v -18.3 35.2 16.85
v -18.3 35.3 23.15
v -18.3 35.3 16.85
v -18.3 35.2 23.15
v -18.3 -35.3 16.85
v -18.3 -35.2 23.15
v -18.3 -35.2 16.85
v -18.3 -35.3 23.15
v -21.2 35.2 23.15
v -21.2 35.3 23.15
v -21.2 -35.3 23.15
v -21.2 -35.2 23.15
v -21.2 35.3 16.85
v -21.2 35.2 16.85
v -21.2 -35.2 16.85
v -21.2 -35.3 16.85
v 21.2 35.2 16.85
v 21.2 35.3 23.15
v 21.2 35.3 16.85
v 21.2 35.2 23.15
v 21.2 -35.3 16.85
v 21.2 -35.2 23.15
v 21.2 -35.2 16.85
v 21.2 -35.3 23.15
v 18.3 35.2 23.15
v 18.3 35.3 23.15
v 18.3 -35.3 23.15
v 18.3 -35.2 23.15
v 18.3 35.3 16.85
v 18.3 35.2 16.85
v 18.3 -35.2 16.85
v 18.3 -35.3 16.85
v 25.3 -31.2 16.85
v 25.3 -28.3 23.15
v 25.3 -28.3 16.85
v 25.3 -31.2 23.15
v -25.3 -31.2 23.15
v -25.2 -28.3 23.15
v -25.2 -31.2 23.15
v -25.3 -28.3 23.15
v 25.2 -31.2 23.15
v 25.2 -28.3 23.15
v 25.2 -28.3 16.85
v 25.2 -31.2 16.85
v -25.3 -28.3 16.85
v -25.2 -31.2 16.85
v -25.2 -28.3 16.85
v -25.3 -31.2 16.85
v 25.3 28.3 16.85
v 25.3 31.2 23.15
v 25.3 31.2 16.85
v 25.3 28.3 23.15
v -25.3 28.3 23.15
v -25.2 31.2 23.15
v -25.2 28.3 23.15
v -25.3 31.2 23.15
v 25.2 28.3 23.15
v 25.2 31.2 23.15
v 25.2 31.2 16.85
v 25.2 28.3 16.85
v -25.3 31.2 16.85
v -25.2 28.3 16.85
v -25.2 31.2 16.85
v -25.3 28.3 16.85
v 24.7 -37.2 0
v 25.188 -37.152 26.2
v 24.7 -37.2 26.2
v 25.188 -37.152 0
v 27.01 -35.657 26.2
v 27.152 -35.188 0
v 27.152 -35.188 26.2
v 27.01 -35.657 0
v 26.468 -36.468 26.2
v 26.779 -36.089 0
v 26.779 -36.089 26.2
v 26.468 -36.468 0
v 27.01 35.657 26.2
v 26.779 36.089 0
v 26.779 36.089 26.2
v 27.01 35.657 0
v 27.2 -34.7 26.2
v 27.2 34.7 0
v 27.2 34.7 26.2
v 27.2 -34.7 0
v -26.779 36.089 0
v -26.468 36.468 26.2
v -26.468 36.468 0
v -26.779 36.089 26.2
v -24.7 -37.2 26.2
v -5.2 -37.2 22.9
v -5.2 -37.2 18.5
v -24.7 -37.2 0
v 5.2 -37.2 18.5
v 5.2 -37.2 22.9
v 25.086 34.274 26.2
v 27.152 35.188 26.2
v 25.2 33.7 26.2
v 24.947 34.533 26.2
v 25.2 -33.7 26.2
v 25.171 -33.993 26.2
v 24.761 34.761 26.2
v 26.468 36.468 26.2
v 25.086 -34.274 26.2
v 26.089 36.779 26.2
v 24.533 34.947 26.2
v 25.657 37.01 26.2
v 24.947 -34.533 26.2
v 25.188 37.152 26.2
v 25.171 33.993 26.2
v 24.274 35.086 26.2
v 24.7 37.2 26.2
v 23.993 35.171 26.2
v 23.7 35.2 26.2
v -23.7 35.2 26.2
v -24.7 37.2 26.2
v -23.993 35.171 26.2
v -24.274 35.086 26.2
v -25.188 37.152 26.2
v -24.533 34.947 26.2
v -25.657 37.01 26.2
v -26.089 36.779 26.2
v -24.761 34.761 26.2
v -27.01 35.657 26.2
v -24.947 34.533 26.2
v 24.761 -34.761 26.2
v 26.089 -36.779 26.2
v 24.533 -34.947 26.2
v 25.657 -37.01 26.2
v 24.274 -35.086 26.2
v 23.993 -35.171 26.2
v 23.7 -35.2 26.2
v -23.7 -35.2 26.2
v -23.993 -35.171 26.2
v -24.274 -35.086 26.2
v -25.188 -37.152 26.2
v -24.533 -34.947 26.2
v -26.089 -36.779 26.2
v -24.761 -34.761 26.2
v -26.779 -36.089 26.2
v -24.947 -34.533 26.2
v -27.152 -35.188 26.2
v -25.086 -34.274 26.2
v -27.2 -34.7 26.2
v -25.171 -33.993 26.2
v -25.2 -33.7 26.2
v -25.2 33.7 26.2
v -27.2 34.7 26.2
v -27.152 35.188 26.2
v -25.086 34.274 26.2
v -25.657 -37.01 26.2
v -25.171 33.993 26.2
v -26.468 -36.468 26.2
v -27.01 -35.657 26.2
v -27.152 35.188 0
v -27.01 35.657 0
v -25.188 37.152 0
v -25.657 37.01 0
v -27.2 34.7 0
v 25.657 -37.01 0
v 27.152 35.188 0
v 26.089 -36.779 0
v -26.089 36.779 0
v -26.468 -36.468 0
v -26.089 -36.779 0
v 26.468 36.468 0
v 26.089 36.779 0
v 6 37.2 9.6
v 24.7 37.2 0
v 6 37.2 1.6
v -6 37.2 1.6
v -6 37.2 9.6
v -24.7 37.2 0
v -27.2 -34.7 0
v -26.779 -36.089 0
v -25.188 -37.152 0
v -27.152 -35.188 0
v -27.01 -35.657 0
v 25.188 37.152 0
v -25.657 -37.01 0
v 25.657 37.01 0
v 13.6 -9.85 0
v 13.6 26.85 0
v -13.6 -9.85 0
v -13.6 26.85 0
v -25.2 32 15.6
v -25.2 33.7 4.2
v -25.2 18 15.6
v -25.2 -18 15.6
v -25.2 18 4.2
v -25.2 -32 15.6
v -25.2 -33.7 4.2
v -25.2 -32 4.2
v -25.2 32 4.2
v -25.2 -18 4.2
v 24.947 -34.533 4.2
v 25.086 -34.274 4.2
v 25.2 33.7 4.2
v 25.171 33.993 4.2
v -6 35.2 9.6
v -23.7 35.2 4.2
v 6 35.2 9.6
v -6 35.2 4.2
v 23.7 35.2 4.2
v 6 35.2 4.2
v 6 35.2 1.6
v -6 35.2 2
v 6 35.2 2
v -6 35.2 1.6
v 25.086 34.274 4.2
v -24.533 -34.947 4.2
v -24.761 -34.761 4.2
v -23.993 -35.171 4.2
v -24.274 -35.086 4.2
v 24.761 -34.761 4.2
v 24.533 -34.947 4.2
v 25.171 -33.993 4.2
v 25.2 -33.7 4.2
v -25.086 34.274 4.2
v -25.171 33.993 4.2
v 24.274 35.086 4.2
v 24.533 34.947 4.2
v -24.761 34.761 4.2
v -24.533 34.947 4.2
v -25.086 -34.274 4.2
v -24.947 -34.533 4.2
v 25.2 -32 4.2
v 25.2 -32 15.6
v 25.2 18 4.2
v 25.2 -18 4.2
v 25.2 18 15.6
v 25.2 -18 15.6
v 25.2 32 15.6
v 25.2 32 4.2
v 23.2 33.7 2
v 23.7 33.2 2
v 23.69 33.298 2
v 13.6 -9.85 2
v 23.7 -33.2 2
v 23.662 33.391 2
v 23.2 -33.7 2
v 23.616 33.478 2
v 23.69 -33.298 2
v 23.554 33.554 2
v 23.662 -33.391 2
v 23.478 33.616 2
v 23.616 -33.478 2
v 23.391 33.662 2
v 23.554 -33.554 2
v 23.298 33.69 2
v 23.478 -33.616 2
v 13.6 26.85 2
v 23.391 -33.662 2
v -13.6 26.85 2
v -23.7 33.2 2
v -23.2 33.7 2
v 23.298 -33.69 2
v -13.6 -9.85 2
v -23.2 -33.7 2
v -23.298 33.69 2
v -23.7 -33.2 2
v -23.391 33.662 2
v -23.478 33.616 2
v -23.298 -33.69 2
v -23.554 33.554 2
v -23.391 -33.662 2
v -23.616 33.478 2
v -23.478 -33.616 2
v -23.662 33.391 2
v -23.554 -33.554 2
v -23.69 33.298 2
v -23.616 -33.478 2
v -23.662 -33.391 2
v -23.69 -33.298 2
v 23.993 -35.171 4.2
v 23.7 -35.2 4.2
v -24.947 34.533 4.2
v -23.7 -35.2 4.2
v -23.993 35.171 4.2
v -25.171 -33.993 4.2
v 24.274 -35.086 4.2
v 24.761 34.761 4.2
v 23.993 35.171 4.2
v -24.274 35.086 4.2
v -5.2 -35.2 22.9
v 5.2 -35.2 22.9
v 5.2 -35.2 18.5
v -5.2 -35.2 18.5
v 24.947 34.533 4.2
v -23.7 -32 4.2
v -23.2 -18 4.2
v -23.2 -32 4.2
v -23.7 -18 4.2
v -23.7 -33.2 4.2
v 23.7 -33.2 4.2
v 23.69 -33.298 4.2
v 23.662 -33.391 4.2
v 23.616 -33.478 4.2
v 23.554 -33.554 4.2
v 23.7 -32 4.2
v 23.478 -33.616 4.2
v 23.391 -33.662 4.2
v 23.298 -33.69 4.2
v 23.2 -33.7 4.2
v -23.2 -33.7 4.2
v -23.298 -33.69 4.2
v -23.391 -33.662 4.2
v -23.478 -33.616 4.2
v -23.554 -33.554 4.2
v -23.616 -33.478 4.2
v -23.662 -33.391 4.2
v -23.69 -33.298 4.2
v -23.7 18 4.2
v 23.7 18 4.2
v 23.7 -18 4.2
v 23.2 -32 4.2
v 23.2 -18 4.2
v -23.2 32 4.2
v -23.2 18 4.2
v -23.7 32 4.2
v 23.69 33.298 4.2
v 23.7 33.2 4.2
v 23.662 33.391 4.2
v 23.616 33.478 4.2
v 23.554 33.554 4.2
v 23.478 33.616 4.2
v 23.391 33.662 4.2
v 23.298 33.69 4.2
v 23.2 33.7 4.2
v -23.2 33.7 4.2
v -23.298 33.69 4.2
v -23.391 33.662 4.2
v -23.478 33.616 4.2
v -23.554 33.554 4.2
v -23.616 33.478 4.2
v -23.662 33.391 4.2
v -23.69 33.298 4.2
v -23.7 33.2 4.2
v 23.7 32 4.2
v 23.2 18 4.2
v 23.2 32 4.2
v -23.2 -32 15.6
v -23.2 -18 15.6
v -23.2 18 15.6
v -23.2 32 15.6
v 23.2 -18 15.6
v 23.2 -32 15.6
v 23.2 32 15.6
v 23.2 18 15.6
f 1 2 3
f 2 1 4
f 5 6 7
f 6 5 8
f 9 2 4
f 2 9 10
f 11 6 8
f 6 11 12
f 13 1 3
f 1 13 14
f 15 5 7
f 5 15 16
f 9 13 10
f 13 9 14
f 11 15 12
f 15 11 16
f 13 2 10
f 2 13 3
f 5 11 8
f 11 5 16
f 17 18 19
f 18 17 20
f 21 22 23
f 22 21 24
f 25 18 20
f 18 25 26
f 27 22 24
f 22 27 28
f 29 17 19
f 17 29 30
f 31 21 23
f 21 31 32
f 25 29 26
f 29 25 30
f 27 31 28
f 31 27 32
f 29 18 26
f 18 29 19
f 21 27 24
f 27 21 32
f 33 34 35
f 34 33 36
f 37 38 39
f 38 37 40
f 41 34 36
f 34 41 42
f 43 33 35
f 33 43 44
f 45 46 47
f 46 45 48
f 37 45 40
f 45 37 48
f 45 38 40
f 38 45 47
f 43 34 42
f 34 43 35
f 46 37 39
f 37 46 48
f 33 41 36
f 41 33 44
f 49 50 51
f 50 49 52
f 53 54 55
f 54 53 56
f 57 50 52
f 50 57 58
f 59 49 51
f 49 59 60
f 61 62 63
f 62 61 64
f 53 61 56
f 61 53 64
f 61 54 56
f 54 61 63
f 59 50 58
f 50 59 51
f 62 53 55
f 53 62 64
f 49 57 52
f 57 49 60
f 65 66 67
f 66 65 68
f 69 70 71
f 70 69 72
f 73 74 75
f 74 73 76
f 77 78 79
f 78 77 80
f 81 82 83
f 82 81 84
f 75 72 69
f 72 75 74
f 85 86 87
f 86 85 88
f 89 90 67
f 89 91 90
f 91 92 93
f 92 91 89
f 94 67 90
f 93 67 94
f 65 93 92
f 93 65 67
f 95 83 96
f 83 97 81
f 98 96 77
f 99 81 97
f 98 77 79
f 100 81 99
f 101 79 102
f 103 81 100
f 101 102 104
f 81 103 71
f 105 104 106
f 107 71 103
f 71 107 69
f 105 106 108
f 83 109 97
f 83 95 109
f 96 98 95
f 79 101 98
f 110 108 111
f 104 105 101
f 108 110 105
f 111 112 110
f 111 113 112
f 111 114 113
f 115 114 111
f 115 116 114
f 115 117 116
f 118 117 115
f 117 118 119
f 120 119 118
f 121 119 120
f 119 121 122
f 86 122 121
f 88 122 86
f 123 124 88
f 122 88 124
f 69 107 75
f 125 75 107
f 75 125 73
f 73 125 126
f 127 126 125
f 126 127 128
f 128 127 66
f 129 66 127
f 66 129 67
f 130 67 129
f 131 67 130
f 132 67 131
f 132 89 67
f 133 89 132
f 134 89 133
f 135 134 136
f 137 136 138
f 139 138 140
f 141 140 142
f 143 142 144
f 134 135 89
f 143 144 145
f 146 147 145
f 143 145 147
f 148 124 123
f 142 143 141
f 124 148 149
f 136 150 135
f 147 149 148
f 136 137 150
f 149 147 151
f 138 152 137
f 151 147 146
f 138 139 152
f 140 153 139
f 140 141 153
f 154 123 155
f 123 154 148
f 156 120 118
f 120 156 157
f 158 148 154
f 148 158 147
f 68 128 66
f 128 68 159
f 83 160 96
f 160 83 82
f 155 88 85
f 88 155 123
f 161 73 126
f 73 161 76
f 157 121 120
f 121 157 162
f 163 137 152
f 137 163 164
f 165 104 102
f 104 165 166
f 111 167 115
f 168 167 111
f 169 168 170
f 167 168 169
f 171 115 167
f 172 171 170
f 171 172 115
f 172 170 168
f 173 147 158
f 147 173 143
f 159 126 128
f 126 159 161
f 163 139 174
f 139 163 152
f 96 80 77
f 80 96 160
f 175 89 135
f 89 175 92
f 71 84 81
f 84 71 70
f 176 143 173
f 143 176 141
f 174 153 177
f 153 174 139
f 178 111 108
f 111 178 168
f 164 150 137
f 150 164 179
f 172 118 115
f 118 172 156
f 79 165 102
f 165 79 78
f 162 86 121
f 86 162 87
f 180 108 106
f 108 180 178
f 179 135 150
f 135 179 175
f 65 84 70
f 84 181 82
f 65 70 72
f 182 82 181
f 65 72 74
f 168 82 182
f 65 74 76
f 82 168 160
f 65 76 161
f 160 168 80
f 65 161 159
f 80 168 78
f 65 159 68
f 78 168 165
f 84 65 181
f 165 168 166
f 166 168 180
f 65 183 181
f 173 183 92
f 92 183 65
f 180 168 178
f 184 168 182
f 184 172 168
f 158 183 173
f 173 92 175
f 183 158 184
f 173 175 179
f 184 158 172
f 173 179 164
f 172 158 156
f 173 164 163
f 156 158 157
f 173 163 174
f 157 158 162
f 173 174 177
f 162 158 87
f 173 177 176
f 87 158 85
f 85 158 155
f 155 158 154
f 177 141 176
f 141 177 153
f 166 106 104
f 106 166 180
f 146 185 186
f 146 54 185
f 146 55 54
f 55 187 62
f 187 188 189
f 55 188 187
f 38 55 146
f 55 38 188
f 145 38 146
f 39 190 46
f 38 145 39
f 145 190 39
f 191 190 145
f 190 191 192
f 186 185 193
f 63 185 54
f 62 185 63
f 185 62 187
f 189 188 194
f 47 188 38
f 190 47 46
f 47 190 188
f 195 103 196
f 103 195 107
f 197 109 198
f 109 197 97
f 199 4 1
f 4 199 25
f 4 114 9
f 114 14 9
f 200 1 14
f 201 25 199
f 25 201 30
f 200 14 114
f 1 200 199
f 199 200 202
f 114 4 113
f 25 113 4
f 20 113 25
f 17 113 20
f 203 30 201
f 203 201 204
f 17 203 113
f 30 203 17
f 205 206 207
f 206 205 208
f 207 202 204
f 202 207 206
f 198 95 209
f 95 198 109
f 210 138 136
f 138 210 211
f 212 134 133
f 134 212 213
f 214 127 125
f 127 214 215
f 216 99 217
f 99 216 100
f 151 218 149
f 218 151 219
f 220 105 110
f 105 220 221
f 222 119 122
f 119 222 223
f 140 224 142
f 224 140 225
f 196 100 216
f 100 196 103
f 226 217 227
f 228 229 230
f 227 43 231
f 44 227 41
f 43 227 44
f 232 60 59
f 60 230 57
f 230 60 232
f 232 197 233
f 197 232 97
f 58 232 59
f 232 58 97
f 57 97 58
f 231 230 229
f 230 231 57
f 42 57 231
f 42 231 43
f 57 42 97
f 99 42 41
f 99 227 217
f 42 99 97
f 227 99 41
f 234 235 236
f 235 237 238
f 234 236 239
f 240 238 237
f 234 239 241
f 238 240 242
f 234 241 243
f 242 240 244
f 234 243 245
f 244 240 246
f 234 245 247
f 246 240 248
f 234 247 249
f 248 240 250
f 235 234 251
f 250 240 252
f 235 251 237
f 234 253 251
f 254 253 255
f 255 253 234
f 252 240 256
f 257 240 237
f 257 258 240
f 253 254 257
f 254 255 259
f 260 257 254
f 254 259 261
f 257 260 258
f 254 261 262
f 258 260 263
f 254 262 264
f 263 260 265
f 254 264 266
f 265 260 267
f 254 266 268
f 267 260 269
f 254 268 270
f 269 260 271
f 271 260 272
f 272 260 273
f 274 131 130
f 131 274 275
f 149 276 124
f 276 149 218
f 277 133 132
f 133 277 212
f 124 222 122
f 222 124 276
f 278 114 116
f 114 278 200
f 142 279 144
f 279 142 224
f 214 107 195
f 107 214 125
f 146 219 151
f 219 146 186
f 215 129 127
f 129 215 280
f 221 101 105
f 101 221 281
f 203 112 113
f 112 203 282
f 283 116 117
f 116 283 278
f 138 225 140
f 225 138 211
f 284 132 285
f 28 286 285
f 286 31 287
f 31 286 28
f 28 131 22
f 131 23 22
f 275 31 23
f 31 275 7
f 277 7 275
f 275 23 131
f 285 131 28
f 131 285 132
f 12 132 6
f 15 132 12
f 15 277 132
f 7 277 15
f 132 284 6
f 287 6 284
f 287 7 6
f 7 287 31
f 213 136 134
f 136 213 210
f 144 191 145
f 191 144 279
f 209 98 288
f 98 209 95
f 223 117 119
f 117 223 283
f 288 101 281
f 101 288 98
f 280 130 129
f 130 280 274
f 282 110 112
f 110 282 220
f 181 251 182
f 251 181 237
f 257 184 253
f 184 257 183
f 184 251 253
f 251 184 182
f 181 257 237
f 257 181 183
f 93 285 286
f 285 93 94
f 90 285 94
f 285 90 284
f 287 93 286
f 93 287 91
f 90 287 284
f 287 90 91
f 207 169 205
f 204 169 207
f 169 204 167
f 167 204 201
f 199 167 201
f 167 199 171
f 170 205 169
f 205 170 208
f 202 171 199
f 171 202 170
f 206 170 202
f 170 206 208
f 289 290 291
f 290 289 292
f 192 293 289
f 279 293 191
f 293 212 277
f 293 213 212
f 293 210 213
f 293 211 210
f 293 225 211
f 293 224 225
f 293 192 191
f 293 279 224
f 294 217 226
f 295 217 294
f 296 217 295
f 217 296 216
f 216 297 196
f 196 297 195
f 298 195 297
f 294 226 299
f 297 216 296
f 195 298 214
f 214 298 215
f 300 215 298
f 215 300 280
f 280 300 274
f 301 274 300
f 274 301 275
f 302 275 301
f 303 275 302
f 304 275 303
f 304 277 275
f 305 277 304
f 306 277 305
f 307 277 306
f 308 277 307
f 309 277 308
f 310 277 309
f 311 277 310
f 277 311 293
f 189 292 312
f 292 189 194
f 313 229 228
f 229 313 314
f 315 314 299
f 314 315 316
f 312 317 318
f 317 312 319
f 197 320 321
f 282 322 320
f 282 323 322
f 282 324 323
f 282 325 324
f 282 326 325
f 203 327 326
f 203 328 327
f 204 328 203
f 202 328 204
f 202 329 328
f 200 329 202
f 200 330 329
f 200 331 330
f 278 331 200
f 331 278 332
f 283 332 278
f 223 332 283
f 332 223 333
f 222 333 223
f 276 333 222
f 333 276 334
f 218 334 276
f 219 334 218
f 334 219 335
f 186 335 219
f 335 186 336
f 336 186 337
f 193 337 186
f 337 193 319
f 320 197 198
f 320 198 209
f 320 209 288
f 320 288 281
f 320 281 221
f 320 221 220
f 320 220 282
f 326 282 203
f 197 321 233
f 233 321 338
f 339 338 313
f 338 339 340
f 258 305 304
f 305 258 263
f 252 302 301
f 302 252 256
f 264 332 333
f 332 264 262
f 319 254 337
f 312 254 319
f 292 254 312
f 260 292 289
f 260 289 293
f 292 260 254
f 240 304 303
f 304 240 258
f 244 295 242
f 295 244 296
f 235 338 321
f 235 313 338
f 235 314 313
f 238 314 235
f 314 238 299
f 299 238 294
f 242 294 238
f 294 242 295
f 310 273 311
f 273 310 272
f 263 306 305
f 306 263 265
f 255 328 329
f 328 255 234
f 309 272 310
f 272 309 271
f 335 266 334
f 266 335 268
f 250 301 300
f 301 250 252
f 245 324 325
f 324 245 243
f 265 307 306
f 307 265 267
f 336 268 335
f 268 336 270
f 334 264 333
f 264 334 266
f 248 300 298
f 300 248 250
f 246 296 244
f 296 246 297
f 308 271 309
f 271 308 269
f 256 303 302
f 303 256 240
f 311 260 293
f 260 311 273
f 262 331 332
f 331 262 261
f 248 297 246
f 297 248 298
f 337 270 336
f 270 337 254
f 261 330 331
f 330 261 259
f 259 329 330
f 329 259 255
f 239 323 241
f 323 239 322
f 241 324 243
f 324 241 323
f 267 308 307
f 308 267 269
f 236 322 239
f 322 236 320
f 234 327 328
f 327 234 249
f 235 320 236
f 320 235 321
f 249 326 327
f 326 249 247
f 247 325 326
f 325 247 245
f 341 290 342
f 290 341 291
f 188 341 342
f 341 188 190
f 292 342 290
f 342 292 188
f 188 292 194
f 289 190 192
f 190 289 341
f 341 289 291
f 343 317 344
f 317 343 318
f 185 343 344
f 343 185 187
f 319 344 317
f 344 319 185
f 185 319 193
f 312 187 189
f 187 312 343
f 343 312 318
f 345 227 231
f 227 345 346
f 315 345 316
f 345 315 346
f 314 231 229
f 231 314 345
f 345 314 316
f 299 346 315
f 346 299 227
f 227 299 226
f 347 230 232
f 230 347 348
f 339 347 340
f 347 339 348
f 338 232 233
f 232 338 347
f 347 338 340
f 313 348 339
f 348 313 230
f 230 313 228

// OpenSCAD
// ============================================================
//  SO-101 Face Display Enclosure
//  ESP32-S3 SuperMini + 2.0" ST7789V 240×320 SPI TFT
//  Bambu Labs A1 Combo — no supports required
//
//  PRINT ORIENTATION
//    shell → face-down on plate (bezel face against bed)
//    lid   → flat-side down
//    mount → face-plate down
//
//  RENDER EACH PART:
//    1. Set PART = "shell" → F6 → File > Export > STL
//    2. Set PART = "lid"   → repeat
//    3. Set PART = "mount" → repeat
//    (PART = "all" shows an exploded preview)
//
//  HARDWARE:
//    Display : 2.0" ST7789V 240×320 TFT, PCB 50×70 mm
//    MCU     : ESP32-S3 SuperMini, PCB ~22.5×18 mm
//    Arm     : SO-ARM100 / SO-101
// ============================================================

PART = "shell";  // "shell" | "lid" | "mount" | "base_mount" | "all"

/* ---- Tolerances ----------------------------------------- */
tol = 0.2;   // general clearance added to female dimensions

/* ---- 2.0" ST7789V display PCB --------------------------- */
D_W  = 50.0;   // PCB width
D_H  = 70.0;   // PCB height
D_T  =  1.6;   // PCB thickness

// Viewable window size
VW   = 27.2;
VH   = 36.7;
// Window center offset from PCB center (screen sits near top; pins at bottom)
VX   =  0.0;
VY   =  8.5;   // positive = toward top edge

// Connector / component protrusion behind the PCB
// (the pin header row at the bottom edge sticks out ~4 mm behind)
PIN_ZONE_H = 12.0;  // height of the pin zone at the bottom of the PCB
PIN_Z      =  4.5;  // how far pins protrude behind PCB back face

/* ---- ESP32-S3 SuperMini (mounted on protoboard) --------- */
E_T   =  7.0;   // flat-soldered ESP32 stack height above protoboard surface
USB_W = 10.0;
USB_H =  4.0;

/* ---- 50×70 mm Protoboard -------------------------------- */
// Both the display and ESP32 connect via jumper wires.
// Display sits at the front (screen faces out through bezel window).
// Protoboard with ESP32 sits behind it.
PB_W  = 50.0;   // protoboard width  (matches display PCB width)
PB_H  = 70.0;   // protoboard height (matches display PCB height)
PB_T  =  1.6;   // protoboard PCB thickness
PB_SO =  2.0;   // standoff height (elevates protoboard off the cavity floor)

/* ---- Box shell ------------------------------------------ */
WALL  = 2.0;    // side/front wall thickness
LEDGE = 1.5;    // display-retainer lip width on inner cavity
WIRE_GAP = 10.0; // space between display back and protoboard front
                 // (jumper wires need ~8 cm to loop around, this gives slack)

// Depth layers (front → back):
//   WALL | display PCB | WIRE_GAP | standoff | protoboard | ESP32 components | margin
INNER_D = D_T + WIRE_GAP + PB_SO + PB_T + E_T + 2.0;

// Internal cavity XY (loose-fit for display PCB)
INNER_W = D_W + 2*tol;
INNER_H = D_H + 2*tol;

// Outer box (front face at z=0, opening at z = WALL + INNER_D)
BOX_W  = INNER_W + 2*WALL;
BOX_H  = INNER_H + 2*WALL;
BOX_D  = WALL + INNER_D;   // WALL = front face; open back for lid

/* ---- Lid ------------------------------------------------ */
LID_T  = 2.5;   // lid floor thickness
SNAP_W = 2.5;   // snap rail width (printed on lid, fits slot in shell)
SNAP_H = 6.0;   // snap rail height
SNAP_HOOK = 0.7;// hook undercut depth

/* ---- Strap mount bracket -------------------------------- */
// Main printable mount for the arm shown in the repo photos.
// The display box bolts to the center holes, then two zip ties or hook-and-loop
// straps pass through the side slots and around a visible arm link.
STRAP_PLATE_W = 100.0;
STRAP_PLATE_H =  92.0;
STRAP_PLATE_T =   4.0;
STRAP_SLOT_W  =   6.0;
STRAP_SLOT_H  =  24.0;
STRAP_SLOT_X  =  40.0;
STRAP_SLOT_Y  =  26.0;
STRAP_HEAD_D  =   6.6;  // M3 socket head clearance on arm side
STRAP_HEAD_H  =   2.5;

/* ---- Legacy base mount bracket -------------------------- */
// Top-hook clamp — slides over the raised top edge of the SO-101 base.
// Two M3 tightening screws through the front arm lock it in place.
//
// Official Base_SO101.stl measurements:
//   Overall base: 110.925 W × 72.0 D × 87.0 H mm
//   Top 18 mm grip zone: ~82.4 W × 17.5 D mm
//
ARM_TOP_W      =  82.4;  // raised top section width (X)
ARM_TOP_D      =  17.5;  // raised top section depth (Y)
HOOK_WALL      =   3.5;  // all wall thickness
HOOK_GRIP      =  18.0;  // how far the arms extend downward from the cap
HOOK_CLEARANCE =   0.4;  // slip fit clearance each side

// Inner screw pattern: attaches to lid bosses (display box back)
LID_BOSS_X = 30.0;
LID_BOSS_Y = 40.0;
MH_D       =  3.3;  // M3 clearance hole

// Two M3 bolts through the front arm press against the arm's front face
CLAMP_SCREW_D = 3.3;

// Derived
HOOK_INNER_W = ARM_TOP_W + 2*HOOK_CLEARANCE;  // 83.2 mm
HOOK_INNER_D = ARM_TOP_D + 2*HOOK_CLEARANCE;  // 18.3 mm
HOOK_OUTER_W = HOOK_INNER_W + 2*HOOK_WALL;    // 90.2 mm
HOOK_OUTER_D = HOOK_INNER_D + 2*HOOK_WALL;    // 25.3 mm

// ============================================================
//  HELPERS
// ============================================================

module rbox(w, h, d, r=2.5) {
    // Rounded-corner box centered in XY, starting at z=0
    hull()
        for (sx=[-1,1], sy=[-1,1])
            translate([sx*(w/2-r), sy*(h/2-r), 0])
                cylinder(r=r, h=d, $fn=32);
}

// ============================================================
//  SHELL
// ============================================================
// Printed face-down. Front bezel is at z=0 (bed).
// Display slides in from the back (z = BOX_D end).
// Lid snaps onto the back.

module shell() {
    difference() {
        // Outer body
        rbox(BOX_W, BOX_H, BOX_D, r=2.5);

        // ── inner cavity (open at back z=BOX_D) ─────────────
        translate([0, 0, WALL])
            rbox(INNER_W, INNER_H, INNER_D + 0.1, r=1.5);

        // ── bezel window through front face ─────────────────
        // Wall goes z=0 → z=WALL. Cut must span z=-0.1 → z=WALL+0.1.
        translate([VX - VW/2, VY - VH/2, -0.1])
            cube([VW, VH, WALL + 0.2]);

        // ── USB-C slot on bottom wall ────────────────────────
        // ESP32 is on the protoboard; orient it so USB-C faces down.
        // z of USB-C centre: WALL + D_T + WIRE_GAP + PB_SO + PB_T + E_T/2
        usb_z = WALL + D_T + WIRE_GAP + PB_SO + PB_T + E_T/2;
        translate([0, -(BOX_H/2 + 0.1), usb_z])
            cube([USB_W + 2*tol, WALL*2 + 0.2, USB_H + 2*tol], center=true);

        // ── cable exit notch on back edge (top wall) ─────────
        translate([0, BOX_H/2 + 0.1, WALL + D_T + 2])
            cube([12, WALL*2 + 0.2, 8], center=true);

        // ── snap-rail slots at back opening (all 4 corners) ──
        // The lid's snap rails slide into these slots.
        slot_inset = 4.0;   // distance from corner
        slot_depth = SNAP_H + 0.2;
        slot_w     = SNAP_W + 2*tol;
        for (sx=[-1,1])
            translate([sx*(INNER_W/2 - slot_inset - slot_w/2),
                       0, BOX_D - slot_depth])
                cube([slot_w, INNER_H + 0.2, slot_depth + 0.1], center=true);
        for (sy=[-1,1])
            translate([0, sy*(INNER_H/2 - slot_inset - slot_w/2),
                       BOX_D - slot_depth])
                cube([INNER_W + 0.2, slot_w, slot_depth + 0.1], center=true);
    }

    // ── display PCB retainer lip ─────────────────────────────
    // A thin ledge just inside the front wall that captures the PCB edges.
    // Runs around all 4 sides except across the window opening.
    translate([0, 0, WALL])
    difference() {
        rbox(INNER_W, INNER_H, D_T + tol + 0.4, r=1.5);
        // Remove center — keep only ledge strip
        rbox(INNER_W - 2*LEDGE, INNER_H - 2*LEDGE, D_T + tol + 0.6, r=0.5);
        // Remove over window so it does not block the screen
        translate([VX, VY, -0.1])
            cube([VW + 2, VH + 2, D_T + 2], center=true);
    }

    // ── Protoboard support ledges ────────────────────────────
    // The previous peg version created disconnected "floating islands" in
    // slicers. These ledges are tied into the side walls and support the
    // protoboard edges at the same height.
    ledge_w = 2.0;
    ledge_l = 14.0;
    ledge_z = WALL + D_T + 0.6;
    ledge_h = WIRE_GAP + PB_SO - 0.6;
    ledge_y = PB_H/2 - 10.0;
    for (sx=[-1,1], sy=[-1,1])
        translate([sx*(INNER_W/2 - ledge_w/2), sy*ledge_y, ledge_z + ledge_h/2])
            cube([ledge_w, ledge_l, ledge_h], center=true);
}

// ============================================================
//  LID
// ============================================================
// Flat plate + snap rails + M3 boss columns for mount bracket.
// Printed flat-side down (rails point up).

module lid() {
    BOSS_OD = 7.0;
    BOSS_H  = 5.0;
    INSERT_D = 4.2;  // M3 heat-set insert bore

    slot_inset = 4.0;

    union() {
        difference() {
            rbox(BOX_W, BOX_H, LID_T, r=2.5);
            // Wire notch on top edge (same side as shell cable exit)
            translate([0, BOX_H/2 + 0.1, LID_T/2])
                cube([12, WALL*2 + 0.2, 8], center=true);
        }

        // Snap rails (slide into shell slots)
        for (sx=[-1,1])
            translate([sx*(INNER_W/2 - slot_inset - SNAP_W/2), 0, LID_T])
            difference() {
                cube([SNAP_W, INNER_H - 2*slot_inset, SNAP_H], center=true);
                // Hook undercut on outer face (pulled inward when sliding in)
                translate([sx*(-SNAP_W/2 + SNAP_HOOK/2), 0, SNAP_H/2 - 2])
                    cube([SNAP_HOOK + 0.1, INNER_H, 2.5], center=true);
            }
        for (sy=[-1,1])
            translate([0, sy*(INNER_H/2 - slot_inset - SNAP_W/2), LID_T])
            difference() {
                cube([INNER_W - 2*slot_inset, SNAP_W, SNAP_H], center=true);
                translate([0, sy*(-SNAP_W/2 + SNAP_HOOK/2), SNAP_H/2 - 2])
                    cube([INNER_W, SNAP_HOOK + 0.1, 2.5], center=true);
            }

        // M3 boss columns for bracket screws
        for (sx=[-1,1], sy=[-1,1])
            translate([sx*LID_BOSS_X/2, sy*LID_BOSS_Y/2, LID_T])
            difference() {
                cylinder(d=BOSS_OD, h=BOSS_H, $fn=20);
                translate([0, 0, -0.1])
                    cylinder(d=INSERT_D, h=BOSS_H + 0.2, $fn=20);
            }
    }
}

// ============================================================
//  ARM MOUNT BRACKET — top-hook clamp
// ============================================================
//
//  Coordinate system (local, non-centered):
//    X: left ← 0 → right  (centered by caller)
//    Y: 0 = front face of bracket, positive = into arm
//    Z: 0 = bottom of face plate, positive = up
//
//  Side view (Y-Z cross section):
//
//    Z
//    │  [top cap]──────────────────┐  ← Z = face_h + HOOK_GRIP + HOOK_WALL
//    │  │                          │
//    │  │ front arm   back arm     │  ← HOOK_GRIP tall
//    │  │ (Y=0..HW)  (Y=HW+HD..)  │
//    │  └──┐ ARM SITS HERE  ┌──────┘  ← Z = face_h
//    │     │                │
//    │     │  face plate    │         ← face_h tall
//    │     │  (Y=0..HW)     │
//    │     │  display box   │
//    │     │  attaches here │
//    └─────────────────────────── Y
//
//  HW = HOOK_WALL, HD = HOOK_INNER_D
//
//  Print orientation: face plate face-down on bed.
//  The 18.3mm bridge (top cap inner span) prints fine on A1 without supports.

module base_mount() {
    face_w = BOX_W + 10;    // face plate width (display box + margin = ~64 mm)
    face_h = BOX_H + 10;    // face plate height (~84 mm)

    difference() {
        union() {
            // ── face plate ────────────────────────────────────
            // Y: 0 → HOOK_WALL,  Z: 0 → face_h,  X: centered
            translate([-face_w/2, 0, 0])
                cube([face_w, HOOK_WALL, face_h]);

            // ── hook front arm ────────────────────────────────
            // Continues face plate upward, wide enough to cover arm
            // Y: 0 → HOOK_WALL,  Z: face_h → face_h+HOOK_GRIP
            translate([-HOOK_OUTER_W/2, 0, face_h])
                cube([HOOK_OUTER_W, HOOK_WALL, HOOK_GRIP]);

            // ── hook top cap ──────────────────────────────────
            // Bridges front arm to back arm
            // Y: 0 → HOOK_OUTER_D,  Z: face_h+HOOK_GRIP → +HOOK_WALL
            translate([-HOOK_OUTER_W/2, 0, face_h + HOOK_GRIP])
                cube([HOOK_OUTER_W,
                      HOOK_OUTER_D,
                      HOOK_WALL]);

            // ── hook back arm ─────────────────────────────────
            // Hangs from back edge of top cap
            // Y: HOOK_WALL+HOOK_INNER_D → +HOOK_WALL,  Z: face_h → face_h+HOOK_GRIP
            translate([-HOOK_OUTER_W/2,
                       HOOK_WALL + HOOK_INNER_D,
                       face_h])
                cube([HOOK_OUTER_W, HOOK_WALL, HOOK_GRIP]);
        }

        // ── M3 holes through face plate for lid bosses ────────
        // Centered on face plate (Z = face_h/2 ± LID_BOSS_Y/2)
        for (sx=[-1,1], sy=[-1,1])
            translate([sx*LID_BOSS_X/2, -0.1, face_h/2 + sy*LID_BOSS_Y/2])
                rotate([-90, 0, 0])
                    cylinder(d=MH_D, h=HOOK_WALL + 0.2, $fn=20);

        // ── 2× M3 tightening holes through front hook arm ─────
        // Bolts press on arm's front face to lock the clamp
        for (sx=[-1,1])
            translate([sx*25, -0.1, face_h + HOOK_GRIP/2])
                rotate([-90, 0, 0])
                    cylinder(d=CLAMP_SCREW_D, h=HOOK_WALL + 0.2, $fn=20);
    }
}

module base_mount_print() {
    // Lay the face plate on the print bed. In assembly coordinates the
    // bracket is vertical; print coordinates rotate the height into Y.
    face_h = BOX_H + 10;
    translate([0, face_h + HOOK_GRIP + HOOK_WALL, 0])
        rotate([90, 0, 0])
            base_mount();
}

module rounded_slot(w, h, d) {
    hull()
        for (sy=[-1,1])
            translate([0, sy*(h/2 - w/2), 0])
                cylinder(d=w, h=d, $fn=24);
}

module strap_mount() {
    difference() {
        // Wide flat plate: side wings keep strap slots accessible after the
        // display box is bolted on.
        rbox(STRAP_PLATE_W, STRAP_PLATE_H, STRAP_PLATE_T, r=3.0);

        // M3 bolts pass through the mount into the lid heat-set inserts.
        for (sx=[-1,1], sy=[-1,1])
            translate([sx*LID_BOSS_X/2, sy*LID_BOSS_Y/2, -0.1]) {
                cylinder(d=MH_D, h=STRAP_PLATE_T + 0.2, $fn=24);
                cylinder(d=STRAP_HEAD_D, h=STRAP_HEAD_H + 0.1, $fn=24);
            }

        // Two straps: one on the left wing and one on the right wing. Each
        // strap uses the upper/lower slot pair, wraps around the arm link,
        // then tightens on itself.
        for (sx=[-1,1], sy=[-1,1])
            translate([sx*STRAP_SLOT_X, sy*STRAP_SLOT_Y, -0.1])
                rounded_slot(STRAP_SLOT_W, STRAP_SLOT_H, STRAP_PLATE_T + 0.2);
    }

    // Low back rails help the plate resist twisting on a printed arm link.
    // They are shallow enough to sand flat if your preferred location is curved.
    for (sy=[-1,1])
        translate([0, sy*34, STRAP_PLATE_T])
            cube([62, 2.0, 1.2], center=true);
}

// ============================================================
//  RENDER
// ============================================================

if (PART == "shell") {
    shell();
}
else if (PART == "lid") {
    // Flip for printing (rails face up, lid back on plate)
    translate([0, 0, LID_T])
        rotate([180, 0, 0])
            lid();
}
else if (PART == "mount") {
    strap_mount();
}
else if (PART == "base_mount") {
    base_mount_print();
}
else if (PART == "all") {
    // Exploded assembly preview
    color("SteelBlue")   shell();
    color("SlateGray", 0.85) translate([0, 0, BOX_D + 8]) lid();
    color("DimGray")     translate([BOX_W + 15, 0, 0]) strap_mount();
}
